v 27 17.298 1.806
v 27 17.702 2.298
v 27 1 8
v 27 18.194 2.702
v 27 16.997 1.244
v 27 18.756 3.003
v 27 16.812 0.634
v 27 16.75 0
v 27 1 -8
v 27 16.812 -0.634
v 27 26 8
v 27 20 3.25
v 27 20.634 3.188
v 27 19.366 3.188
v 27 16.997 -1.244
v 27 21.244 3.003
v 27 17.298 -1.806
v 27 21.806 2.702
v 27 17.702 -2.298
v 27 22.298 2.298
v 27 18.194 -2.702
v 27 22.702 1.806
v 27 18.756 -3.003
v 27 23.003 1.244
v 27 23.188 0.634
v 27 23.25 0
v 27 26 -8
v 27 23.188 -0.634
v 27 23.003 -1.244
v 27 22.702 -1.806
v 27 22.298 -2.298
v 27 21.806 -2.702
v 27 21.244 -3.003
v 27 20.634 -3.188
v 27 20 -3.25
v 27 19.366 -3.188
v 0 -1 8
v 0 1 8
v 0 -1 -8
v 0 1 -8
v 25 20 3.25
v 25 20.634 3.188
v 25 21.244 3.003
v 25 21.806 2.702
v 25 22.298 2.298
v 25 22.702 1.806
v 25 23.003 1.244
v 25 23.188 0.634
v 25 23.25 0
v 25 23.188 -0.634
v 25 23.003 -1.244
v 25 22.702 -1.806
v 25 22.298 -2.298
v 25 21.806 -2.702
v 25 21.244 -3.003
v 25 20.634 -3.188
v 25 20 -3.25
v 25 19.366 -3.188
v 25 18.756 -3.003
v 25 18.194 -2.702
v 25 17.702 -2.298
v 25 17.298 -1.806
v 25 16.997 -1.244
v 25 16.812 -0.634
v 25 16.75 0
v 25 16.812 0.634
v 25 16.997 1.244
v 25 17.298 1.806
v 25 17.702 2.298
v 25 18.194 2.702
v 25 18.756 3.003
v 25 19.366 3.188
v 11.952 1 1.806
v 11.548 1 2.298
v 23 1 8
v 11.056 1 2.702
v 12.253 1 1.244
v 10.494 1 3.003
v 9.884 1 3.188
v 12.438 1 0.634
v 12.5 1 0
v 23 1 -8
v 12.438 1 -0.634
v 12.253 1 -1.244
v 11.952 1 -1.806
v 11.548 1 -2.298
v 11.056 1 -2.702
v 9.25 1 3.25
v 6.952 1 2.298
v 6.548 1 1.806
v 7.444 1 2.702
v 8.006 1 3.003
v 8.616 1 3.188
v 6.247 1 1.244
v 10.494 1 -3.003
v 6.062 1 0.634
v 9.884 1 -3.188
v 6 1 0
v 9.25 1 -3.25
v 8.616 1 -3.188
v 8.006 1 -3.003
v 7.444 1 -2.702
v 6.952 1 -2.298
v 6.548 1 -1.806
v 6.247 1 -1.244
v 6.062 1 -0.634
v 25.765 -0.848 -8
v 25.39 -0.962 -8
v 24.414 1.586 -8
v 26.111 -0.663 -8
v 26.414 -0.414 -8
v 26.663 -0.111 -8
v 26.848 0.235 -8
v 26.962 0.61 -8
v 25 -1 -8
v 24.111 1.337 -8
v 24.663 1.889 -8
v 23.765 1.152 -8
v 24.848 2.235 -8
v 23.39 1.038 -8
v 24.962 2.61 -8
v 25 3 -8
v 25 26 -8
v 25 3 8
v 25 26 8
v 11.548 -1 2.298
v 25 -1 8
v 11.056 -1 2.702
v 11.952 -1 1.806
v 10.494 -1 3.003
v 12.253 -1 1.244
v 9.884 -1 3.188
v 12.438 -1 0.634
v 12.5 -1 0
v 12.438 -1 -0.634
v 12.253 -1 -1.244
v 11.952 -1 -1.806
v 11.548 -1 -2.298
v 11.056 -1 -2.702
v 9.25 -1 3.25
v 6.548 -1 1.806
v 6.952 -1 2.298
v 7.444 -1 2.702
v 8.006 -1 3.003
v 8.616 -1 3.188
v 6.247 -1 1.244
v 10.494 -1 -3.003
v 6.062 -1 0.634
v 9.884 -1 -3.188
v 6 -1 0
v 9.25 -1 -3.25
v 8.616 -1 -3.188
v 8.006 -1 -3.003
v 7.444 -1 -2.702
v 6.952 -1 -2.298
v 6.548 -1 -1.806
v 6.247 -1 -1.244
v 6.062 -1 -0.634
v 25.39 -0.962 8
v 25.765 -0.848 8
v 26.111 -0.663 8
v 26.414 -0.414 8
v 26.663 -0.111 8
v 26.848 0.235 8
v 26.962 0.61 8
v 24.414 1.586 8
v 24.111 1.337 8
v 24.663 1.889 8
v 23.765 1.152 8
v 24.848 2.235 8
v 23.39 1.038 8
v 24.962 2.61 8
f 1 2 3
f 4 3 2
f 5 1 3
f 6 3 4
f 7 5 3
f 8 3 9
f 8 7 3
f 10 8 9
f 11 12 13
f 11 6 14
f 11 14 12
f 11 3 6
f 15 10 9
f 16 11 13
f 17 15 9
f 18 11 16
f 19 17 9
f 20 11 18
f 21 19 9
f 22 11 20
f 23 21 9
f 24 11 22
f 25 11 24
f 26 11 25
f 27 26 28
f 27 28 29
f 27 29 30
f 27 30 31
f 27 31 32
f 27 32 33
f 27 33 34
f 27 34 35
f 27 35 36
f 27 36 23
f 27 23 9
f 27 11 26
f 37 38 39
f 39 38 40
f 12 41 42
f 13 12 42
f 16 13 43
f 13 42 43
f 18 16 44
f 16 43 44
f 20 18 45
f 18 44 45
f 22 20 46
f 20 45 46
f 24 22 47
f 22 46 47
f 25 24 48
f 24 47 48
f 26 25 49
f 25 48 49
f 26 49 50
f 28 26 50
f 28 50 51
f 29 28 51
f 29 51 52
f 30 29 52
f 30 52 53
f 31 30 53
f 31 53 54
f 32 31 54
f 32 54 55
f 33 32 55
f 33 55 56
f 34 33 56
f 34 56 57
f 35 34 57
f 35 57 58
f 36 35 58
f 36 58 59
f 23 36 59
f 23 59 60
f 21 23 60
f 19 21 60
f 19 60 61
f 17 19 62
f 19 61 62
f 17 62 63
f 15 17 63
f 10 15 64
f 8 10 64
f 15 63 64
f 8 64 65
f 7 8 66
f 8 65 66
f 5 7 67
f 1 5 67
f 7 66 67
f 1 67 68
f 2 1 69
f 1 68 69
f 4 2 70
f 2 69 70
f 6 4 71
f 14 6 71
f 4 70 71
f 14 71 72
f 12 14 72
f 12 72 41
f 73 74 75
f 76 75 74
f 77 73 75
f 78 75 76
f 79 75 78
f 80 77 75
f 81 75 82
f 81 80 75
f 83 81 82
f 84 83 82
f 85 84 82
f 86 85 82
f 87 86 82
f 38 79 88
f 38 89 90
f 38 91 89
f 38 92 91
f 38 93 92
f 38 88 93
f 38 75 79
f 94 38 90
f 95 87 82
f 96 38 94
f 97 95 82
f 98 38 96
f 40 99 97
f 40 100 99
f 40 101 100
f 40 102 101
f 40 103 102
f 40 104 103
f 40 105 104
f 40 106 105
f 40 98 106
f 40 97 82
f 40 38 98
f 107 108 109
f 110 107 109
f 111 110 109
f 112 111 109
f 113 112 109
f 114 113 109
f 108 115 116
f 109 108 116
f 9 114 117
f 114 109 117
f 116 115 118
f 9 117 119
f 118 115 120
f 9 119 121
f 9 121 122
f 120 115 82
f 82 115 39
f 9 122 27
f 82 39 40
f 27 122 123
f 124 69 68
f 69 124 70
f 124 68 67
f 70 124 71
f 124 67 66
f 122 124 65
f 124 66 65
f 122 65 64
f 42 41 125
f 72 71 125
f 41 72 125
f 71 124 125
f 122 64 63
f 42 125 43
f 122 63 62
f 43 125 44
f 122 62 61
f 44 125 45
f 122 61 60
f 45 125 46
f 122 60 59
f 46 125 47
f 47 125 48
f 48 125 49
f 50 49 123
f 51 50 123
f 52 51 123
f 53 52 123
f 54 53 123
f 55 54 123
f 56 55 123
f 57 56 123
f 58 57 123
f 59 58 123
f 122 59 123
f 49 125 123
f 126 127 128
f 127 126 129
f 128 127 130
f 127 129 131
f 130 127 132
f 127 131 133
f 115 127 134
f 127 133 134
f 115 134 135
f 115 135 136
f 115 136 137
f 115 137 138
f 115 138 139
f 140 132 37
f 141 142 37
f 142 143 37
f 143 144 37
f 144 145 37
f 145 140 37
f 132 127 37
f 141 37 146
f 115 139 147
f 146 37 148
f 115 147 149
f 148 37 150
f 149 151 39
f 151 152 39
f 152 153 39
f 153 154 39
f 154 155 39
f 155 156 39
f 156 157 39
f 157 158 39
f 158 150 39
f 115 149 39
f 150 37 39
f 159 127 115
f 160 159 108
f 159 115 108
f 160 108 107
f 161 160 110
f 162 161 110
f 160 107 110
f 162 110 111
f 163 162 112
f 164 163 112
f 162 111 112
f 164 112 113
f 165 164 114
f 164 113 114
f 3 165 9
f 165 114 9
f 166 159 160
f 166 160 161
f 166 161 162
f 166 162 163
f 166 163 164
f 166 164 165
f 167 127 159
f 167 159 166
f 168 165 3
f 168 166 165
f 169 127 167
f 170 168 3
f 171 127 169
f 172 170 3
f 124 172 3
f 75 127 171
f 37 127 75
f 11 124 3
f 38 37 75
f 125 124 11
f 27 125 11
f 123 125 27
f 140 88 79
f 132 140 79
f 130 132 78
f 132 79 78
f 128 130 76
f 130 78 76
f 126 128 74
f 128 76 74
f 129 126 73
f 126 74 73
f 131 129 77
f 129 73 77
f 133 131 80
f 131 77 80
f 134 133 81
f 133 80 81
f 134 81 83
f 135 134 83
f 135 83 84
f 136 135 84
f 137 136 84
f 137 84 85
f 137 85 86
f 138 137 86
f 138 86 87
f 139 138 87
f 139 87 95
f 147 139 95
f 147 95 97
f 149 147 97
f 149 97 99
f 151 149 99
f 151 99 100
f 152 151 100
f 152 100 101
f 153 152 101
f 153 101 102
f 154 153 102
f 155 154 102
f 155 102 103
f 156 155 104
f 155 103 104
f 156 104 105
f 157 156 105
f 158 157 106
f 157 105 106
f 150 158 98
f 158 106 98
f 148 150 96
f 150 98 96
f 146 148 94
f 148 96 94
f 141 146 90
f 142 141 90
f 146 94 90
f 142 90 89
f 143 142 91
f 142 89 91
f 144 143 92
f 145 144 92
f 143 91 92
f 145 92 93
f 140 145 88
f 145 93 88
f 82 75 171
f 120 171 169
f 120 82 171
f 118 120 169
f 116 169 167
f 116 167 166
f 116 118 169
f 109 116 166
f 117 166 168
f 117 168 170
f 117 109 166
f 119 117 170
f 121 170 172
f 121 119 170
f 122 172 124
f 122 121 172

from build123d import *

# Parameters (mm, degrees)
CROQUIS2_W              = 16
CROQUIS2_H              = 2
SALIENTE_EXTRUIR3_DEPTH = 25
CROQUIS3_W              = 16
CROQUIS3_H              = 27
SALIENTE_EXTRUIR4_DEPTH = 2
REDONDEO1_R             = 2
CROQUIS4_R              = 3.25
CORTAR_EXTRUIR1_DEPTH   = 38.656340768
CROQUIS5_R              = 3.25
CORTAR_EXTRUIR2_DEPTH   = 37.945906404


with BuildPart() as part:
    # Croquis2 → Saliente-Extruir3 (new body)
    with BuildSketch(Plane(origin=(0, 0, 0), x_dir=(0, 0, -1), z_dir=(1, 0, 0))):
        Rectangle(CROQUIS2_W, CROQUIS2_H)
    extrude(amount=SALIENTE_EXTRUIR3_DEPTH)

    # Croquis3 → Saliente-Extruir4 (add)
    with BuildSketch(Plane(origin=(25, 0, 0), x_dir=(0, 0, -1), z_dir=(1, 0, 0))):
        with Locations((0, 12.5)):
            Rectangle(CROQUIS3_W, CROQUIS3_H)
    extrude(amount=SALIENTE_EXTRUIR4_DEPTH)

    # Redondeo1
    redondeo1_edges = [part.edges().sort_by_distance(p)[0] for p in [
        (27, -1, 0),
        (25, 1, 0),
    ]]
    fillet(redondeo1_edges, radius=REDONDEO1_R)

    # Croquis4 → Cortar-Extruir1 (cut, through all)
    with BuildSketch(Plane(origin=(0, 1, 0), x_dir=(1, 0, 0), z_dir=(0, 1, 0))):
        with Locations(Location((9.25, 0, 0), (0, 0, 270))):
            Circle(CROQUIS4_R)
    extrude(amount=-CORTAR_EXTRUIR1_DEPTH, mode=Mode.SUBTRACT)

    # Croquis5 → Cortar-Extruir2 (cut, through all)
    with BuildSketch(Plane.ZY.offset(-25)):
        with Locations((0, 20)):
            Circle(CROQUIS5_R)
    extrude(amount=-CORTAR_EXTRUIR2_DEPTH, mode=Mode.SUBTRACT)


solid = part.part
